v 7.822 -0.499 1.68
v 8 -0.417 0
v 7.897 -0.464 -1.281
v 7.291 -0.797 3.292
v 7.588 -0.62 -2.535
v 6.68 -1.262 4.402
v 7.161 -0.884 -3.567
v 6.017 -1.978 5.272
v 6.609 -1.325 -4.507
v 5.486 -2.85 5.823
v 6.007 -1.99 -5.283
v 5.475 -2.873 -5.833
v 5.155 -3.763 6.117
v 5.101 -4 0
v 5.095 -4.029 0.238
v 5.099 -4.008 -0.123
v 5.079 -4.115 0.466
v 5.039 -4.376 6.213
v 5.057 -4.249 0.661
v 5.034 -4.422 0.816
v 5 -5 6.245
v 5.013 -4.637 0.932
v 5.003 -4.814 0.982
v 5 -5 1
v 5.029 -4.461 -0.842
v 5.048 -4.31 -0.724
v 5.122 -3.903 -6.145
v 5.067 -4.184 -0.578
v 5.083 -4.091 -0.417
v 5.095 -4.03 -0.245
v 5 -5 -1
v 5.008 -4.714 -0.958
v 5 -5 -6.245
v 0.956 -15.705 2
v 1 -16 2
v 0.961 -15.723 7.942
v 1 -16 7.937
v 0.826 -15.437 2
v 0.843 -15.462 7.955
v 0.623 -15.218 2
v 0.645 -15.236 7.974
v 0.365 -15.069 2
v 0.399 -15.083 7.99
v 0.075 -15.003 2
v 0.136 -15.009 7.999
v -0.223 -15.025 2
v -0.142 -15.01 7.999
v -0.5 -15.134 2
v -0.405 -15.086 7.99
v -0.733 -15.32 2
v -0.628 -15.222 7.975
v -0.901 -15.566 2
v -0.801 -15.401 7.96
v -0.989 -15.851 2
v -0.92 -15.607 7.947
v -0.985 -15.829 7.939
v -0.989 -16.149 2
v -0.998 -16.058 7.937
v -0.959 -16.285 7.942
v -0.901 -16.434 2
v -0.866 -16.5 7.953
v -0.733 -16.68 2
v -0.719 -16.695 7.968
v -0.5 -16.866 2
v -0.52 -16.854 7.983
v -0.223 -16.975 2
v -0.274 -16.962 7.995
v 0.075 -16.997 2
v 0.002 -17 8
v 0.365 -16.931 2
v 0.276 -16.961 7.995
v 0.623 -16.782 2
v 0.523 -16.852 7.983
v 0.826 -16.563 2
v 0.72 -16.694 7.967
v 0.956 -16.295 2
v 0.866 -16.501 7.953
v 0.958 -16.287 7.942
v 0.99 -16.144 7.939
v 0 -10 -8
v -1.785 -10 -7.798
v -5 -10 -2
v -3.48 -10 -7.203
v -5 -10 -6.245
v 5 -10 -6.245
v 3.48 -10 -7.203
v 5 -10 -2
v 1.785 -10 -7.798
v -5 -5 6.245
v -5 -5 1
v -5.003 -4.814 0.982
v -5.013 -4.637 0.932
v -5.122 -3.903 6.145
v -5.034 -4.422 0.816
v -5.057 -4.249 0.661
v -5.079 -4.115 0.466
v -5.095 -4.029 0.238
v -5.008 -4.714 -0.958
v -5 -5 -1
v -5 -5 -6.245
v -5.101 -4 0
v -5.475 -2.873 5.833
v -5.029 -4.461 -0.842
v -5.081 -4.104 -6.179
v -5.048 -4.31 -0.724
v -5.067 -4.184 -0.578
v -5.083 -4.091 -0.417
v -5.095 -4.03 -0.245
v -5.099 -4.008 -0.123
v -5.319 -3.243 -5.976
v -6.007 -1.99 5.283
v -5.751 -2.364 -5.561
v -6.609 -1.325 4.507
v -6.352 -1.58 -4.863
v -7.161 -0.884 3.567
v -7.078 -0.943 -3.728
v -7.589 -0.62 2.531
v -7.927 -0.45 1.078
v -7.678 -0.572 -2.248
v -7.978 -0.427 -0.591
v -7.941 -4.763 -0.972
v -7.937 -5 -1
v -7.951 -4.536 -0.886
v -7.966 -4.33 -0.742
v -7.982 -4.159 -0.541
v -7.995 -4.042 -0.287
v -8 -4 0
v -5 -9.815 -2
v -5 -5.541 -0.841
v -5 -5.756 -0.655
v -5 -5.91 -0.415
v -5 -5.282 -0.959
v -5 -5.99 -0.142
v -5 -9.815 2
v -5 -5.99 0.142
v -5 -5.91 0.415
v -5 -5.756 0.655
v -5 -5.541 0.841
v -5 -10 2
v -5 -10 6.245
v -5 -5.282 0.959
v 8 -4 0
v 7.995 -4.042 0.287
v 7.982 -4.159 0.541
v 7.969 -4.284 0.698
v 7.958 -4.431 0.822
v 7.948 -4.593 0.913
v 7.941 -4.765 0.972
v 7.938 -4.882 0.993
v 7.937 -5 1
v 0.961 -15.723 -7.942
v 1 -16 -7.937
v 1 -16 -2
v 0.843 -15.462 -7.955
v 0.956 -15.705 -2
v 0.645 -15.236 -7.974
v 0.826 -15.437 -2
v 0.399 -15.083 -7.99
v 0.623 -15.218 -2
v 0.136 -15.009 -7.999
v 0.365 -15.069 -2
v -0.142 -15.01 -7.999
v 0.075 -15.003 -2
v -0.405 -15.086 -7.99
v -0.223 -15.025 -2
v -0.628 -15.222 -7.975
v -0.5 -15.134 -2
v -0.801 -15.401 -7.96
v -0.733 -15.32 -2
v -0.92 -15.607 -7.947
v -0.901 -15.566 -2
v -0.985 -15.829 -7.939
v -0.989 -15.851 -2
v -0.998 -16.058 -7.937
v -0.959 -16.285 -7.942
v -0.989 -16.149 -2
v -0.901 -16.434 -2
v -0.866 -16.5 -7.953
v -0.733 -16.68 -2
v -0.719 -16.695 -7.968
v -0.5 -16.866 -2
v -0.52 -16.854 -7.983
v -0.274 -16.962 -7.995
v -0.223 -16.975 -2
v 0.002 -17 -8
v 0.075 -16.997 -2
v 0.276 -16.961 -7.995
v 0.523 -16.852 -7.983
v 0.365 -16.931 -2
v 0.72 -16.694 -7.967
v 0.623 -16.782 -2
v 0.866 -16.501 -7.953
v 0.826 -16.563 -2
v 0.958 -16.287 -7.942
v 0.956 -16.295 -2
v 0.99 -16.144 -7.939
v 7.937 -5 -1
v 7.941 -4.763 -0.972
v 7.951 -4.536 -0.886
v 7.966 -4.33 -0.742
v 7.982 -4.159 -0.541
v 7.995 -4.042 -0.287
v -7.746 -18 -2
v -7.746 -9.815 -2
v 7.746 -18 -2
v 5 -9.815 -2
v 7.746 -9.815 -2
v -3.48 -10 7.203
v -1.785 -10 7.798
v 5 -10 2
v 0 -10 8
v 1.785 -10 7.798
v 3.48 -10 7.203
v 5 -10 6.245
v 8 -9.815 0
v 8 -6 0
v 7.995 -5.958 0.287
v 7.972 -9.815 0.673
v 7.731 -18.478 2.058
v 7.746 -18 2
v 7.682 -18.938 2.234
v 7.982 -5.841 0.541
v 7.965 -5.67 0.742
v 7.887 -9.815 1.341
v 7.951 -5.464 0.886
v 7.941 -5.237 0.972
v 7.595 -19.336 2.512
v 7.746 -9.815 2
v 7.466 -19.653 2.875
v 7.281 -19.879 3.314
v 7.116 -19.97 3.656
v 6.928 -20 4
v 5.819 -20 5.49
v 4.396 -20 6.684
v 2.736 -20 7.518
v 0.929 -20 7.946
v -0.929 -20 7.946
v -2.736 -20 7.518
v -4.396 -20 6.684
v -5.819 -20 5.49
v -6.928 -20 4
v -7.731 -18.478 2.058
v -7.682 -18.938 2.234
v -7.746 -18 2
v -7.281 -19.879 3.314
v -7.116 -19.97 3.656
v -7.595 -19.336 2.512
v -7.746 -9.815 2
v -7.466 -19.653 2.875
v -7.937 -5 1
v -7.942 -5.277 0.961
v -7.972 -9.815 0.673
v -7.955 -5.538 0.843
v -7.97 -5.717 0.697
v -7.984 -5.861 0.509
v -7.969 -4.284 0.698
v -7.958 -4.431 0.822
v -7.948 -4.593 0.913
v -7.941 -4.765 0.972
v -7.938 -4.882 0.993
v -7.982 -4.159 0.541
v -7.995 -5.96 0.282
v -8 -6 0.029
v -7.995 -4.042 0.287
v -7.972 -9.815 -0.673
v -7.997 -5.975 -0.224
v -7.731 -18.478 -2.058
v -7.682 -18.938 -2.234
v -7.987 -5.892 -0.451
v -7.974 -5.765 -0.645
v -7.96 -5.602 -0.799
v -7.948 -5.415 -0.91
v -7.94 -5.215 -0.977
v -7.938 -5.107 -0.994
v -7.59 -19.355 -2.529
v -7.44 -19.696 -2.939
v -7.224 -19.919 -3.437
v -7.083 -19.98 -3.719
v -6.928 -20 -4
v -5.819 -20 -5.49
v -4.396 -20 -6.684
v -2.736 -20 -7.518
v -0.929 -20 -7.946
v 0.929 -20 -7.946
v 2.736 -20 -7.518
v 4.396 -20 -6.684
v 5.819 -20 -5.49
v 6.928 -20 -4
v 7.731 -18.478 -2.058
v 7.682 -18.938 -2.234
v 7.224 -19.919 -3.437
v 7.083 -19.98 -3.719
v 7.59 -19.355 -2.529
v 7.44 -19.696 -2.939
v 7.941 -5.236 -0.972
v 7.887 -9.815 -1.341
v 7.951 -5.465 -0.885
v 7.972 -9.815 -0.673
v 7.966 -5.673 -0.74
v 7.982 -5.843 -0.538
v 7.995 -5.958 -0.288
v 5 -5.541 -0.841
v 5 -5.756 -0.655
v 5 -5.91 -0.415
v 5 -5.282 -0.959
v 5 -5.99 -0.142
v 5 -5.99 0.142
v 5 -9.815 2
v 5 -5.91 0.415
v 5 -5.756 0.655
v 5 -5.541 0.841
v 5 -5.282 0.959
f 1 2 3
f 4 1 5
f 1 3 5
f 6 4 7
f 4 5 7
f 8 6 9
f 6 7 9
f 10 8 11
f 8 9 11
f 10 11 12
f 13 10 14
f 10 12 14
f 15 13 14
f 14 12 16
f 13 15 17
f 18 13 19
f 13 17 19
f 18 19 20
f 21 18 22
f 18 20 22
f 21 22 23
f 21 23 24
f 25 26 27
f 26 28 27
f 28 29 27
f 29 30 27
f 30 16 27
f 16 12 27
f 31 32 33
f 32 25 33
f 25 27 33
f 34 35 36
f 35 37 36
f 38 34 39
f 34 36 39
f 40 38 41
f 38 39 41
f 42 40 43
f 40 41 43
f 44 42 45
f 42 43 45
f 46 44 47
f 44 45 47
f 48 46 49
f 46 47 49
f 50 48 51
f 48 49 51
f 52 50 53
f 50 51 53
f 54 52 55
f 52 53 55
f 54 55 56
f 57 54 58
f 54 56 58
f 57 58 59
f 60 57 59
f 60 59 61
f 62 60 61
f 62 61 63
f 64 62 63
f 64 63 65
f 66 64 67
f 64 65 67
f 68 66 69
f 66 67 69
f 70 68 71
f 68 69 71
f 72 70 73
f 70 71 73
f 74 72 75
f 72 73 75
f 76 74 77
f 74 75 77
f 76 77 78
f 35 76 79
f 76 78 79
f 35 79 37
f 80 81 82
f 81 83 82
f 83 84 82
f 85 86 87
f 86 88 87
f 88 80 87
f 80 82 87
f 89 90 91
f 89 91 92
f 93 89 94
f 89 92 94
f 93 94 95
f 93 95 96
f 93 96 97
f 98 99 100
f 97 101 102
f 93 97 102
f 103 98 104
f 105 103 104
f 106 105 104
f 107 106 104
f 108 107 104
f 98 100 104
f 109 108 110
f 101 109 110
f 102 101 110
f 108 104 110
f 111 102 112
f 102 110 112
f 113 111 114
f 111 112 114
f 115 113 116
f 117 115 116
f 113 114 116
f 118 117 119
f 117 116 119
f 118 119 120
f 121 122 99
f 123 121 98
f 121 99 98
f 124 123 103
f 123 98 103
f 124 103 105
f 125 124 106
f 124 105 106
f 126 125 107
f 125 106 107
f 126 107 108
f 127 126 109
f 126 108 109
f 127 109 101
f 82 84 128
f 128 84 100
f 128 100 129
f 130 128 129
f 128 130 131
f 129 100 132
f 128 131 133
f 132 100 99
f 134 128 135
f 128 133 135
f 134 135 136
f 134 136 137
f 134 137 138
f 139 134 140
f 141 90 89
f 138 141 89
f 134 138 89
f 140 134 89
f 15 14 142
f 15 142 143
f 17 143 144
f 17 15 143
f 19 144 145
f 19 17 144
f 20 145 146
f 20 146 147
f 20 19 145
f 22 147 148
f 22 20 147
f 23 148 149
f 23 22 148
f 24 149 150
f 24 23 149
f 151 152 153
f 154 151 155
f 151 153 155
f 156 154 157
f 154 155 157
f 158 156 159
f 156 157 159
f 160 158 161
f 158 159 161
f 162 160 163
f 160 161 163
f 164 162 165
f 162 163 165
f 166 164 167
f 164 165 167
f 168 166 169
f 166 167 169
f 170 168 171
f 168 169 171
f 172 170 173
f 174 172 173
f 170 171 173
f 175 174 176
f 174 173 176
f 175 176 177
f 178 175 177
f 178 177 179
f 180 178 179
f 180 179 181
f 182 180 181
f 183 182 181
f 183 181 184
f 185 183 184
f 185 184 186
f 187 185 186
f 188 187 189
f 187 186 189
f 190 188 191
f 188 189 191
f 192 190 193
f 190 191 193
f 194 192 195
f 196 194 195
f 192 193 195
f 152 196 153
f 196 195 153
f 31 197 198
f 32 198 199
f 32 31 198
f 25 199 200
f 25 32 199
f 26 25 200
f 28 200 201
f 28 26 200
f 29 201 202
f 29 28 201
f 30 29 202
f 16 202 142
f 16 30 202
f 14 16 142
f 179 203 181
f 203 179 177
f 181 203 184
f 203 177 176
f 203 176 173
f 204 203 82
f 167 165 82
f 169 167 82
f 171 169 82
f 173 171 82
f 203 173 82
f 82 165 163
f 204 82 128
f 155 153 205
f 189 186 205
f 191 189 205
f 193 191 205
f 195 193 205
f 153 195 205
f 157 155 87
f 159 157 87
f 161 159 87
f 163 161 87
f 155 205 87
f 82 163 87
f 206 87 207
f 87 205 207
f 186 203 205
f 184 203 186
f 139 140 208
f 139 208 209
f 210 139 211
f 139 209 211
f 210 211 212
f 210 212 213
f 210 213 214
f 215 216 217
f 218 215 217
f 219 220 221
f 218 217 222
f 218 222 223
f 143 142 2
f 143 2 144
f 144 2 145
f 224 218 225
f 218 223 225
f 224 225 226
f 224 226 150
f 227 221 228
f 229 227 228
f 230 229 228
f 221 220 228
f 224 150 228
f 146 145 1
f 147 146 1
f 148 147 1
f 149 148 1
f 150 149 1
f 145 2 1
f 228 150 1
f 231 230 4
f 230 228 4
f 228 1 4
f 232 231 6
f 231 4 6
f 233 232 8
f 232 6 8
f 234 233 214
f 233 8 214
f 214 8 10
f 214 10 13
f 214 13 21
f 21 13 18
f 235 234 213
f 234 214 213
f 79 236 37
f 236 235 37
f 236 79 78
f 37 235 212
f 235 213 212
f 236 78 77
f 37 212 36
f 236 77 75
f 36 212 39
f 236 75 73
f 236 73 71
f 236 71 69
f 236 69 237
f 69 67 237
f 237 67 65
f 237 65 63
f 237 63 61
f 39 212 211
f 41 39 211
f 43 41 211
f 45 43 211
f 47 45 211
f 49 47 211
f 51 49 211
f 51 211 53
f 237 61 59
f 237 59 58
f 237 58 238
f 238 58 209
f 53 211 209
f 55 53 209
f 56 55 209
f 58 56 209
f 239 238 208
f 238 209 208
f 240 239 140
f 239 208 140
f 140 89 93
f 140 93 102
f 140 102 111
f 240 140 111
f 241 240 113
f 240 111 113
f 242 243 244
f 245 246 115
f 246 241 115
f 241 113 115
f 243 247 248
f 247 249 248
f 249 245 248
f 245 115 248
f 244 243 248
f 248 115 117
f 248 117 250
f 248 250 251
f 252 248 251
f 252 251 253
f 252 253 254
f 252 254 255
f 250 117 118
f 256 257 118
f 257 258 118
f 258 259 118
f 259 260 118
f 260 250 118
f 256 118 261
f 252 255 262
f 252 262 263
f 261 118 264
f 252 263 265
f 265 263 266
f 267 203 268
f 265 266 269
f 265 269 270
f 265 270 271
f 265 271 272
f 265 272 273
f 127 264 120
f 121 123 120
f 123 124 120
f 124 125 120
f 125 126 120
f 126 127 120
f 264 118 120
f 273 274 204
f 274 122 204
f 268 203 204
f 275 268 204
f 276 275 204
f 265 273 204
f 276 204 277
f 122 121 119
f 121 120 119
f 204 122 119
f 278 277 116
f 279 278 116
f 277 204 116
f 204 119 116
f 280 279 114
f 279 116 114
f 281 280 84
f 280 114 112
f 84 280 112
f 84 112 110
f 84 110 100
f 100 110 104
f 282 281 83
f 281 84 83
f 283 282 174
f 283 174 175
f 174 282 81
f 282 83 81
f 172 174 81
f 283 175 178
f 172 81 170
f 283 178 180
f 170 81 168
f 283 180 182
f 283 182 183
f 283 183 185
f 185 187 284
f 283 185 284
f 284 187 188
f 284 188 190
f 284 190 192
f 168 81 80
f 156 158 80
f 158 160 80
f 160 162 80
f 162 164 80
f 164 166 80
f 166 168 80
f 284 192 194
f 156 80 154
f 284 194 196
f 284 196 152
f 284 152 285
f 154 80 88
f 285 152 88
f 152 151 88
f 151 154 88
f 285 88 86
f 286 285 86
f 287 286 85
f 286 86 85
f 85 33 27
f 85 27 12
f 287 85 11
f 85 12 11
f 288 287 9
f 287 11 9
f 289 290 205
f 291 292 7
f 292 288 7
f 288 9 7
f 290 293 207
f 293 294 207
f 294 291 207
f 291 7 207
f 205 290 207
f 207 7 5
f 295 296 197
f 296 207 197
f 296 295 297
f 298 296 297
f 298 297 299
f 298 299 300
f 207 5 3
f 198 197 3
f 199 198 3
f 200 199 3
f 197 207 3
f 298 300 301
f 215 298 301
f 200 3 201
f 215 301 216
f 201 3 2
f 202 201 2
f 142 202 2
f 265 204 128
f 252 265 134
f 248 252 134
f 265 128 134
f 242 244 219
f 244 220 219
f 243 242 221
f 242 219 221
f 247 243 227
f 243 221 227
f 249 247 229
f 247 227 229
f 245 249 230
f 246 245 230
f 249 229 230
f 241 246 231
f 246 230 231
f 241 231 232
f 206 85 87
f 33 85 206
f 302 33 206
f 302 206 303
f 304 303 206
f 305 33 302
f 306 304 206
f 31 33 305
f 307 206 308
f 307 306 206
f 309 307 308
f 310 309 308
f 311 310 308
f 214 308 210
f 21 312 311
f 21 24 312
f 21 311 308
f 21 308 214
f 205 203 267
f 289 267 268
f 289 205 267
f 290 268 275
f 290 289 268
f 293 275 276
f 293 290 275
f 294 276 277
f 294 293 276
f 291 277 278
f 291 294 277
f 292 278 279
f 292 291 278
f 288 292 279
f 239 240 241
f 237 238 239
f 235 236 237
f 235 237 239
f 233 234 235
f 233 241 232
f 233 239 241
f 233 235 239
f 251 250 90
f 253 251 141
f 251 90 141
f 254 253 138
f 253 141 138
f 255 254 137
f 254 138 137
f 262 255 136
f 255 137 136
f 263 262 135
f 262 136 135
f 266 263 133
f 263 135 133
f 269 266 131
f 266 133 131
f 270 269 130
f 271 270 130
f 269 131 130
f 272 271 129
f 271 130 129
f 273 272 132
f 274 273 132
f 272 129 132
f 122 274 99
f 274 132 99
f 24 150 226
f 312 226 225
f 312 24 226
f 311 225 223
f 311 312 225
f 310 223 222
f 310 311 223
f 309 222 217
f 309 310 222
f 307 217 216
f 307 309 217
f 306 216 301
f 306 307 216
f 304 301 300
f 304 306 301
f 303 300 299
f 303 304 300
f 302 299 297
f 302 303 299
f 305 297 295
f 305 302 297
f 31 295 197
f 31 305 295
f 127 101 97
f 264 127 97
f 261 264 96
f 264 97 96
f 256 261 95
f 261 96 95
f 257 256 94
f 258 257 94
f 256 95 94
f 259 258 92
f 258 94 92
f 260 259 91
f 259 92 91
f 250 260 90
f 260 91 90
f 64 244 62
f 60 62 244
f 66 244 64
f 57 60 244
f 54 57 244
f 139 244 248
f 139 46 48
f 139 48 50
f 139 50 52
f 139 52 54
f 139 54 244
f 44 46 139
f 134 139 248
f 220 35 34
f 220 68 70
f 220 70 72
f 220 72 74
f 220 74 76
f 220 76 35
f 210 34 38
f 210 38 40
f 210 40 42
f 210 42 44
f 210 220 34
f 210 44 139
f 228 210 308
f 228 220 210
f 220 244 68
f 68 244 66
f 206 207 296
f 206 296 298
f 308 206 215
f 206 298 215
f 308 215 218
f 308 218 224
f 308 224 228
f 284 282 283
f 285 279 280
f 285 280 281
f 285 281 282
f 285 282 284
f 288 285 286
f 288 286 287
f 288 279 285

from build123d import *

# Parameters (mm, degrees)
F0_R        = 8
F1_DEPTH    = 20
F2_W        = 10
F2_H        = 20.4895668926
F3_DEPTH    = 10
F4_W        = 20
F4_H        = 4
F5_DEPTH    = 50
F6_T1_DEPTH = 37.4899959968
F7_R        = 2
F9_DEPTH    = 50
F10_R       = 1
F11_DEPTH   = 25


# Not quite as in the source:
# - a fillet or chamfer that OpenCascade refuses, or shapes differently, is made with other operations: its cross-section is extruded or revolved along the edge and cut away or added


with BuildPart() as f1:
    # F0 (on Front) → F1 (new body)
    with BuildSketch(Plane.XZ):
        Circle(F0_R)
    extrude(amount=F1_DEPTH)

    # F2 (on Front) → F3 (cut)
    with BuildSketch(Plane.XZ):
        Rectangle(F2_W, F2_H)
    extrude(amount=F3_DEPTH, mode=Mode.SUBTRACT)

    # F4 (on Right) → F5 (cut, symmetric)
    with BuildSketch(Plane.YZ):
        with Locations((-19.8148275974, 0)):
            Rectangle(F4_W, F4_H)
    extrude(amount=F5_DEPTH, both=True, mode=Mode.SUBTRACT)

    # F6: fillet of radius 5 on 2 edges, made by hand

    # F6_s2 → F6_t1 (cut)
    with BuildSketch(Plane.XY.offset(-18.7449979984)):
        with BuildLine():
            ThreePointArc((10, 0), (6.4644660941, -1.4644660941), (5, -5))
            Line((5, -5), (5, 0))
            Line((5, 0), (10, 0))
        make_face()
        with BuildLine():
            ThreePointArc((-5, -5), (-6.4644660941, -1.4644660941), (-10, 0))
            Line((-10, 0), (-5, 0))
            Line((-5, 0), (-5, -5))
        make_face()
    extrude(amount=F6_T1_DEPTH, mode=Mode.SUBTRACT)

    # F7
    f7_edges = [f1.edges().sort_by_distance(p)[0] for p in [
        (0, -20, -2),
        (0, -20, 2),
    ]]
    fillet(f7_edges, radius=F7_R)

    # F8 (on face) → F9 (cut, symmetric)
    with BuildSketch(Plane.YZ.offset(-5)):
        with BuildLine():
            Line((-5, -1), (-5, 1))
            ThreePointArc((-5, 1), (-6, 0), (-5, -1))
        make_face()
        with BuildLine():
            ThreePointArc((-5, -1), (-4.2928932188, -0.7071067812), (-4, 0))
            ThreePointArc((-4, 0), (-4.2928932188, 0.7071067812), (-5, 1))
            Line((-5, 1), (-5, -1))
        make_face()
    extrude(amount=F9_DEPTH, both=True, mode=Mode.SUBTRACT)

    # F10 (on Top) → F11 (cut, symmetric)
    with BuildSketch(Plane.XY):
        with Locations((0, -16)):
            Circle(F10_R)
    extrude(amount=F11_DEPTH, both=True, mode=Mode.SUBTRACT)


solid = f1.part
